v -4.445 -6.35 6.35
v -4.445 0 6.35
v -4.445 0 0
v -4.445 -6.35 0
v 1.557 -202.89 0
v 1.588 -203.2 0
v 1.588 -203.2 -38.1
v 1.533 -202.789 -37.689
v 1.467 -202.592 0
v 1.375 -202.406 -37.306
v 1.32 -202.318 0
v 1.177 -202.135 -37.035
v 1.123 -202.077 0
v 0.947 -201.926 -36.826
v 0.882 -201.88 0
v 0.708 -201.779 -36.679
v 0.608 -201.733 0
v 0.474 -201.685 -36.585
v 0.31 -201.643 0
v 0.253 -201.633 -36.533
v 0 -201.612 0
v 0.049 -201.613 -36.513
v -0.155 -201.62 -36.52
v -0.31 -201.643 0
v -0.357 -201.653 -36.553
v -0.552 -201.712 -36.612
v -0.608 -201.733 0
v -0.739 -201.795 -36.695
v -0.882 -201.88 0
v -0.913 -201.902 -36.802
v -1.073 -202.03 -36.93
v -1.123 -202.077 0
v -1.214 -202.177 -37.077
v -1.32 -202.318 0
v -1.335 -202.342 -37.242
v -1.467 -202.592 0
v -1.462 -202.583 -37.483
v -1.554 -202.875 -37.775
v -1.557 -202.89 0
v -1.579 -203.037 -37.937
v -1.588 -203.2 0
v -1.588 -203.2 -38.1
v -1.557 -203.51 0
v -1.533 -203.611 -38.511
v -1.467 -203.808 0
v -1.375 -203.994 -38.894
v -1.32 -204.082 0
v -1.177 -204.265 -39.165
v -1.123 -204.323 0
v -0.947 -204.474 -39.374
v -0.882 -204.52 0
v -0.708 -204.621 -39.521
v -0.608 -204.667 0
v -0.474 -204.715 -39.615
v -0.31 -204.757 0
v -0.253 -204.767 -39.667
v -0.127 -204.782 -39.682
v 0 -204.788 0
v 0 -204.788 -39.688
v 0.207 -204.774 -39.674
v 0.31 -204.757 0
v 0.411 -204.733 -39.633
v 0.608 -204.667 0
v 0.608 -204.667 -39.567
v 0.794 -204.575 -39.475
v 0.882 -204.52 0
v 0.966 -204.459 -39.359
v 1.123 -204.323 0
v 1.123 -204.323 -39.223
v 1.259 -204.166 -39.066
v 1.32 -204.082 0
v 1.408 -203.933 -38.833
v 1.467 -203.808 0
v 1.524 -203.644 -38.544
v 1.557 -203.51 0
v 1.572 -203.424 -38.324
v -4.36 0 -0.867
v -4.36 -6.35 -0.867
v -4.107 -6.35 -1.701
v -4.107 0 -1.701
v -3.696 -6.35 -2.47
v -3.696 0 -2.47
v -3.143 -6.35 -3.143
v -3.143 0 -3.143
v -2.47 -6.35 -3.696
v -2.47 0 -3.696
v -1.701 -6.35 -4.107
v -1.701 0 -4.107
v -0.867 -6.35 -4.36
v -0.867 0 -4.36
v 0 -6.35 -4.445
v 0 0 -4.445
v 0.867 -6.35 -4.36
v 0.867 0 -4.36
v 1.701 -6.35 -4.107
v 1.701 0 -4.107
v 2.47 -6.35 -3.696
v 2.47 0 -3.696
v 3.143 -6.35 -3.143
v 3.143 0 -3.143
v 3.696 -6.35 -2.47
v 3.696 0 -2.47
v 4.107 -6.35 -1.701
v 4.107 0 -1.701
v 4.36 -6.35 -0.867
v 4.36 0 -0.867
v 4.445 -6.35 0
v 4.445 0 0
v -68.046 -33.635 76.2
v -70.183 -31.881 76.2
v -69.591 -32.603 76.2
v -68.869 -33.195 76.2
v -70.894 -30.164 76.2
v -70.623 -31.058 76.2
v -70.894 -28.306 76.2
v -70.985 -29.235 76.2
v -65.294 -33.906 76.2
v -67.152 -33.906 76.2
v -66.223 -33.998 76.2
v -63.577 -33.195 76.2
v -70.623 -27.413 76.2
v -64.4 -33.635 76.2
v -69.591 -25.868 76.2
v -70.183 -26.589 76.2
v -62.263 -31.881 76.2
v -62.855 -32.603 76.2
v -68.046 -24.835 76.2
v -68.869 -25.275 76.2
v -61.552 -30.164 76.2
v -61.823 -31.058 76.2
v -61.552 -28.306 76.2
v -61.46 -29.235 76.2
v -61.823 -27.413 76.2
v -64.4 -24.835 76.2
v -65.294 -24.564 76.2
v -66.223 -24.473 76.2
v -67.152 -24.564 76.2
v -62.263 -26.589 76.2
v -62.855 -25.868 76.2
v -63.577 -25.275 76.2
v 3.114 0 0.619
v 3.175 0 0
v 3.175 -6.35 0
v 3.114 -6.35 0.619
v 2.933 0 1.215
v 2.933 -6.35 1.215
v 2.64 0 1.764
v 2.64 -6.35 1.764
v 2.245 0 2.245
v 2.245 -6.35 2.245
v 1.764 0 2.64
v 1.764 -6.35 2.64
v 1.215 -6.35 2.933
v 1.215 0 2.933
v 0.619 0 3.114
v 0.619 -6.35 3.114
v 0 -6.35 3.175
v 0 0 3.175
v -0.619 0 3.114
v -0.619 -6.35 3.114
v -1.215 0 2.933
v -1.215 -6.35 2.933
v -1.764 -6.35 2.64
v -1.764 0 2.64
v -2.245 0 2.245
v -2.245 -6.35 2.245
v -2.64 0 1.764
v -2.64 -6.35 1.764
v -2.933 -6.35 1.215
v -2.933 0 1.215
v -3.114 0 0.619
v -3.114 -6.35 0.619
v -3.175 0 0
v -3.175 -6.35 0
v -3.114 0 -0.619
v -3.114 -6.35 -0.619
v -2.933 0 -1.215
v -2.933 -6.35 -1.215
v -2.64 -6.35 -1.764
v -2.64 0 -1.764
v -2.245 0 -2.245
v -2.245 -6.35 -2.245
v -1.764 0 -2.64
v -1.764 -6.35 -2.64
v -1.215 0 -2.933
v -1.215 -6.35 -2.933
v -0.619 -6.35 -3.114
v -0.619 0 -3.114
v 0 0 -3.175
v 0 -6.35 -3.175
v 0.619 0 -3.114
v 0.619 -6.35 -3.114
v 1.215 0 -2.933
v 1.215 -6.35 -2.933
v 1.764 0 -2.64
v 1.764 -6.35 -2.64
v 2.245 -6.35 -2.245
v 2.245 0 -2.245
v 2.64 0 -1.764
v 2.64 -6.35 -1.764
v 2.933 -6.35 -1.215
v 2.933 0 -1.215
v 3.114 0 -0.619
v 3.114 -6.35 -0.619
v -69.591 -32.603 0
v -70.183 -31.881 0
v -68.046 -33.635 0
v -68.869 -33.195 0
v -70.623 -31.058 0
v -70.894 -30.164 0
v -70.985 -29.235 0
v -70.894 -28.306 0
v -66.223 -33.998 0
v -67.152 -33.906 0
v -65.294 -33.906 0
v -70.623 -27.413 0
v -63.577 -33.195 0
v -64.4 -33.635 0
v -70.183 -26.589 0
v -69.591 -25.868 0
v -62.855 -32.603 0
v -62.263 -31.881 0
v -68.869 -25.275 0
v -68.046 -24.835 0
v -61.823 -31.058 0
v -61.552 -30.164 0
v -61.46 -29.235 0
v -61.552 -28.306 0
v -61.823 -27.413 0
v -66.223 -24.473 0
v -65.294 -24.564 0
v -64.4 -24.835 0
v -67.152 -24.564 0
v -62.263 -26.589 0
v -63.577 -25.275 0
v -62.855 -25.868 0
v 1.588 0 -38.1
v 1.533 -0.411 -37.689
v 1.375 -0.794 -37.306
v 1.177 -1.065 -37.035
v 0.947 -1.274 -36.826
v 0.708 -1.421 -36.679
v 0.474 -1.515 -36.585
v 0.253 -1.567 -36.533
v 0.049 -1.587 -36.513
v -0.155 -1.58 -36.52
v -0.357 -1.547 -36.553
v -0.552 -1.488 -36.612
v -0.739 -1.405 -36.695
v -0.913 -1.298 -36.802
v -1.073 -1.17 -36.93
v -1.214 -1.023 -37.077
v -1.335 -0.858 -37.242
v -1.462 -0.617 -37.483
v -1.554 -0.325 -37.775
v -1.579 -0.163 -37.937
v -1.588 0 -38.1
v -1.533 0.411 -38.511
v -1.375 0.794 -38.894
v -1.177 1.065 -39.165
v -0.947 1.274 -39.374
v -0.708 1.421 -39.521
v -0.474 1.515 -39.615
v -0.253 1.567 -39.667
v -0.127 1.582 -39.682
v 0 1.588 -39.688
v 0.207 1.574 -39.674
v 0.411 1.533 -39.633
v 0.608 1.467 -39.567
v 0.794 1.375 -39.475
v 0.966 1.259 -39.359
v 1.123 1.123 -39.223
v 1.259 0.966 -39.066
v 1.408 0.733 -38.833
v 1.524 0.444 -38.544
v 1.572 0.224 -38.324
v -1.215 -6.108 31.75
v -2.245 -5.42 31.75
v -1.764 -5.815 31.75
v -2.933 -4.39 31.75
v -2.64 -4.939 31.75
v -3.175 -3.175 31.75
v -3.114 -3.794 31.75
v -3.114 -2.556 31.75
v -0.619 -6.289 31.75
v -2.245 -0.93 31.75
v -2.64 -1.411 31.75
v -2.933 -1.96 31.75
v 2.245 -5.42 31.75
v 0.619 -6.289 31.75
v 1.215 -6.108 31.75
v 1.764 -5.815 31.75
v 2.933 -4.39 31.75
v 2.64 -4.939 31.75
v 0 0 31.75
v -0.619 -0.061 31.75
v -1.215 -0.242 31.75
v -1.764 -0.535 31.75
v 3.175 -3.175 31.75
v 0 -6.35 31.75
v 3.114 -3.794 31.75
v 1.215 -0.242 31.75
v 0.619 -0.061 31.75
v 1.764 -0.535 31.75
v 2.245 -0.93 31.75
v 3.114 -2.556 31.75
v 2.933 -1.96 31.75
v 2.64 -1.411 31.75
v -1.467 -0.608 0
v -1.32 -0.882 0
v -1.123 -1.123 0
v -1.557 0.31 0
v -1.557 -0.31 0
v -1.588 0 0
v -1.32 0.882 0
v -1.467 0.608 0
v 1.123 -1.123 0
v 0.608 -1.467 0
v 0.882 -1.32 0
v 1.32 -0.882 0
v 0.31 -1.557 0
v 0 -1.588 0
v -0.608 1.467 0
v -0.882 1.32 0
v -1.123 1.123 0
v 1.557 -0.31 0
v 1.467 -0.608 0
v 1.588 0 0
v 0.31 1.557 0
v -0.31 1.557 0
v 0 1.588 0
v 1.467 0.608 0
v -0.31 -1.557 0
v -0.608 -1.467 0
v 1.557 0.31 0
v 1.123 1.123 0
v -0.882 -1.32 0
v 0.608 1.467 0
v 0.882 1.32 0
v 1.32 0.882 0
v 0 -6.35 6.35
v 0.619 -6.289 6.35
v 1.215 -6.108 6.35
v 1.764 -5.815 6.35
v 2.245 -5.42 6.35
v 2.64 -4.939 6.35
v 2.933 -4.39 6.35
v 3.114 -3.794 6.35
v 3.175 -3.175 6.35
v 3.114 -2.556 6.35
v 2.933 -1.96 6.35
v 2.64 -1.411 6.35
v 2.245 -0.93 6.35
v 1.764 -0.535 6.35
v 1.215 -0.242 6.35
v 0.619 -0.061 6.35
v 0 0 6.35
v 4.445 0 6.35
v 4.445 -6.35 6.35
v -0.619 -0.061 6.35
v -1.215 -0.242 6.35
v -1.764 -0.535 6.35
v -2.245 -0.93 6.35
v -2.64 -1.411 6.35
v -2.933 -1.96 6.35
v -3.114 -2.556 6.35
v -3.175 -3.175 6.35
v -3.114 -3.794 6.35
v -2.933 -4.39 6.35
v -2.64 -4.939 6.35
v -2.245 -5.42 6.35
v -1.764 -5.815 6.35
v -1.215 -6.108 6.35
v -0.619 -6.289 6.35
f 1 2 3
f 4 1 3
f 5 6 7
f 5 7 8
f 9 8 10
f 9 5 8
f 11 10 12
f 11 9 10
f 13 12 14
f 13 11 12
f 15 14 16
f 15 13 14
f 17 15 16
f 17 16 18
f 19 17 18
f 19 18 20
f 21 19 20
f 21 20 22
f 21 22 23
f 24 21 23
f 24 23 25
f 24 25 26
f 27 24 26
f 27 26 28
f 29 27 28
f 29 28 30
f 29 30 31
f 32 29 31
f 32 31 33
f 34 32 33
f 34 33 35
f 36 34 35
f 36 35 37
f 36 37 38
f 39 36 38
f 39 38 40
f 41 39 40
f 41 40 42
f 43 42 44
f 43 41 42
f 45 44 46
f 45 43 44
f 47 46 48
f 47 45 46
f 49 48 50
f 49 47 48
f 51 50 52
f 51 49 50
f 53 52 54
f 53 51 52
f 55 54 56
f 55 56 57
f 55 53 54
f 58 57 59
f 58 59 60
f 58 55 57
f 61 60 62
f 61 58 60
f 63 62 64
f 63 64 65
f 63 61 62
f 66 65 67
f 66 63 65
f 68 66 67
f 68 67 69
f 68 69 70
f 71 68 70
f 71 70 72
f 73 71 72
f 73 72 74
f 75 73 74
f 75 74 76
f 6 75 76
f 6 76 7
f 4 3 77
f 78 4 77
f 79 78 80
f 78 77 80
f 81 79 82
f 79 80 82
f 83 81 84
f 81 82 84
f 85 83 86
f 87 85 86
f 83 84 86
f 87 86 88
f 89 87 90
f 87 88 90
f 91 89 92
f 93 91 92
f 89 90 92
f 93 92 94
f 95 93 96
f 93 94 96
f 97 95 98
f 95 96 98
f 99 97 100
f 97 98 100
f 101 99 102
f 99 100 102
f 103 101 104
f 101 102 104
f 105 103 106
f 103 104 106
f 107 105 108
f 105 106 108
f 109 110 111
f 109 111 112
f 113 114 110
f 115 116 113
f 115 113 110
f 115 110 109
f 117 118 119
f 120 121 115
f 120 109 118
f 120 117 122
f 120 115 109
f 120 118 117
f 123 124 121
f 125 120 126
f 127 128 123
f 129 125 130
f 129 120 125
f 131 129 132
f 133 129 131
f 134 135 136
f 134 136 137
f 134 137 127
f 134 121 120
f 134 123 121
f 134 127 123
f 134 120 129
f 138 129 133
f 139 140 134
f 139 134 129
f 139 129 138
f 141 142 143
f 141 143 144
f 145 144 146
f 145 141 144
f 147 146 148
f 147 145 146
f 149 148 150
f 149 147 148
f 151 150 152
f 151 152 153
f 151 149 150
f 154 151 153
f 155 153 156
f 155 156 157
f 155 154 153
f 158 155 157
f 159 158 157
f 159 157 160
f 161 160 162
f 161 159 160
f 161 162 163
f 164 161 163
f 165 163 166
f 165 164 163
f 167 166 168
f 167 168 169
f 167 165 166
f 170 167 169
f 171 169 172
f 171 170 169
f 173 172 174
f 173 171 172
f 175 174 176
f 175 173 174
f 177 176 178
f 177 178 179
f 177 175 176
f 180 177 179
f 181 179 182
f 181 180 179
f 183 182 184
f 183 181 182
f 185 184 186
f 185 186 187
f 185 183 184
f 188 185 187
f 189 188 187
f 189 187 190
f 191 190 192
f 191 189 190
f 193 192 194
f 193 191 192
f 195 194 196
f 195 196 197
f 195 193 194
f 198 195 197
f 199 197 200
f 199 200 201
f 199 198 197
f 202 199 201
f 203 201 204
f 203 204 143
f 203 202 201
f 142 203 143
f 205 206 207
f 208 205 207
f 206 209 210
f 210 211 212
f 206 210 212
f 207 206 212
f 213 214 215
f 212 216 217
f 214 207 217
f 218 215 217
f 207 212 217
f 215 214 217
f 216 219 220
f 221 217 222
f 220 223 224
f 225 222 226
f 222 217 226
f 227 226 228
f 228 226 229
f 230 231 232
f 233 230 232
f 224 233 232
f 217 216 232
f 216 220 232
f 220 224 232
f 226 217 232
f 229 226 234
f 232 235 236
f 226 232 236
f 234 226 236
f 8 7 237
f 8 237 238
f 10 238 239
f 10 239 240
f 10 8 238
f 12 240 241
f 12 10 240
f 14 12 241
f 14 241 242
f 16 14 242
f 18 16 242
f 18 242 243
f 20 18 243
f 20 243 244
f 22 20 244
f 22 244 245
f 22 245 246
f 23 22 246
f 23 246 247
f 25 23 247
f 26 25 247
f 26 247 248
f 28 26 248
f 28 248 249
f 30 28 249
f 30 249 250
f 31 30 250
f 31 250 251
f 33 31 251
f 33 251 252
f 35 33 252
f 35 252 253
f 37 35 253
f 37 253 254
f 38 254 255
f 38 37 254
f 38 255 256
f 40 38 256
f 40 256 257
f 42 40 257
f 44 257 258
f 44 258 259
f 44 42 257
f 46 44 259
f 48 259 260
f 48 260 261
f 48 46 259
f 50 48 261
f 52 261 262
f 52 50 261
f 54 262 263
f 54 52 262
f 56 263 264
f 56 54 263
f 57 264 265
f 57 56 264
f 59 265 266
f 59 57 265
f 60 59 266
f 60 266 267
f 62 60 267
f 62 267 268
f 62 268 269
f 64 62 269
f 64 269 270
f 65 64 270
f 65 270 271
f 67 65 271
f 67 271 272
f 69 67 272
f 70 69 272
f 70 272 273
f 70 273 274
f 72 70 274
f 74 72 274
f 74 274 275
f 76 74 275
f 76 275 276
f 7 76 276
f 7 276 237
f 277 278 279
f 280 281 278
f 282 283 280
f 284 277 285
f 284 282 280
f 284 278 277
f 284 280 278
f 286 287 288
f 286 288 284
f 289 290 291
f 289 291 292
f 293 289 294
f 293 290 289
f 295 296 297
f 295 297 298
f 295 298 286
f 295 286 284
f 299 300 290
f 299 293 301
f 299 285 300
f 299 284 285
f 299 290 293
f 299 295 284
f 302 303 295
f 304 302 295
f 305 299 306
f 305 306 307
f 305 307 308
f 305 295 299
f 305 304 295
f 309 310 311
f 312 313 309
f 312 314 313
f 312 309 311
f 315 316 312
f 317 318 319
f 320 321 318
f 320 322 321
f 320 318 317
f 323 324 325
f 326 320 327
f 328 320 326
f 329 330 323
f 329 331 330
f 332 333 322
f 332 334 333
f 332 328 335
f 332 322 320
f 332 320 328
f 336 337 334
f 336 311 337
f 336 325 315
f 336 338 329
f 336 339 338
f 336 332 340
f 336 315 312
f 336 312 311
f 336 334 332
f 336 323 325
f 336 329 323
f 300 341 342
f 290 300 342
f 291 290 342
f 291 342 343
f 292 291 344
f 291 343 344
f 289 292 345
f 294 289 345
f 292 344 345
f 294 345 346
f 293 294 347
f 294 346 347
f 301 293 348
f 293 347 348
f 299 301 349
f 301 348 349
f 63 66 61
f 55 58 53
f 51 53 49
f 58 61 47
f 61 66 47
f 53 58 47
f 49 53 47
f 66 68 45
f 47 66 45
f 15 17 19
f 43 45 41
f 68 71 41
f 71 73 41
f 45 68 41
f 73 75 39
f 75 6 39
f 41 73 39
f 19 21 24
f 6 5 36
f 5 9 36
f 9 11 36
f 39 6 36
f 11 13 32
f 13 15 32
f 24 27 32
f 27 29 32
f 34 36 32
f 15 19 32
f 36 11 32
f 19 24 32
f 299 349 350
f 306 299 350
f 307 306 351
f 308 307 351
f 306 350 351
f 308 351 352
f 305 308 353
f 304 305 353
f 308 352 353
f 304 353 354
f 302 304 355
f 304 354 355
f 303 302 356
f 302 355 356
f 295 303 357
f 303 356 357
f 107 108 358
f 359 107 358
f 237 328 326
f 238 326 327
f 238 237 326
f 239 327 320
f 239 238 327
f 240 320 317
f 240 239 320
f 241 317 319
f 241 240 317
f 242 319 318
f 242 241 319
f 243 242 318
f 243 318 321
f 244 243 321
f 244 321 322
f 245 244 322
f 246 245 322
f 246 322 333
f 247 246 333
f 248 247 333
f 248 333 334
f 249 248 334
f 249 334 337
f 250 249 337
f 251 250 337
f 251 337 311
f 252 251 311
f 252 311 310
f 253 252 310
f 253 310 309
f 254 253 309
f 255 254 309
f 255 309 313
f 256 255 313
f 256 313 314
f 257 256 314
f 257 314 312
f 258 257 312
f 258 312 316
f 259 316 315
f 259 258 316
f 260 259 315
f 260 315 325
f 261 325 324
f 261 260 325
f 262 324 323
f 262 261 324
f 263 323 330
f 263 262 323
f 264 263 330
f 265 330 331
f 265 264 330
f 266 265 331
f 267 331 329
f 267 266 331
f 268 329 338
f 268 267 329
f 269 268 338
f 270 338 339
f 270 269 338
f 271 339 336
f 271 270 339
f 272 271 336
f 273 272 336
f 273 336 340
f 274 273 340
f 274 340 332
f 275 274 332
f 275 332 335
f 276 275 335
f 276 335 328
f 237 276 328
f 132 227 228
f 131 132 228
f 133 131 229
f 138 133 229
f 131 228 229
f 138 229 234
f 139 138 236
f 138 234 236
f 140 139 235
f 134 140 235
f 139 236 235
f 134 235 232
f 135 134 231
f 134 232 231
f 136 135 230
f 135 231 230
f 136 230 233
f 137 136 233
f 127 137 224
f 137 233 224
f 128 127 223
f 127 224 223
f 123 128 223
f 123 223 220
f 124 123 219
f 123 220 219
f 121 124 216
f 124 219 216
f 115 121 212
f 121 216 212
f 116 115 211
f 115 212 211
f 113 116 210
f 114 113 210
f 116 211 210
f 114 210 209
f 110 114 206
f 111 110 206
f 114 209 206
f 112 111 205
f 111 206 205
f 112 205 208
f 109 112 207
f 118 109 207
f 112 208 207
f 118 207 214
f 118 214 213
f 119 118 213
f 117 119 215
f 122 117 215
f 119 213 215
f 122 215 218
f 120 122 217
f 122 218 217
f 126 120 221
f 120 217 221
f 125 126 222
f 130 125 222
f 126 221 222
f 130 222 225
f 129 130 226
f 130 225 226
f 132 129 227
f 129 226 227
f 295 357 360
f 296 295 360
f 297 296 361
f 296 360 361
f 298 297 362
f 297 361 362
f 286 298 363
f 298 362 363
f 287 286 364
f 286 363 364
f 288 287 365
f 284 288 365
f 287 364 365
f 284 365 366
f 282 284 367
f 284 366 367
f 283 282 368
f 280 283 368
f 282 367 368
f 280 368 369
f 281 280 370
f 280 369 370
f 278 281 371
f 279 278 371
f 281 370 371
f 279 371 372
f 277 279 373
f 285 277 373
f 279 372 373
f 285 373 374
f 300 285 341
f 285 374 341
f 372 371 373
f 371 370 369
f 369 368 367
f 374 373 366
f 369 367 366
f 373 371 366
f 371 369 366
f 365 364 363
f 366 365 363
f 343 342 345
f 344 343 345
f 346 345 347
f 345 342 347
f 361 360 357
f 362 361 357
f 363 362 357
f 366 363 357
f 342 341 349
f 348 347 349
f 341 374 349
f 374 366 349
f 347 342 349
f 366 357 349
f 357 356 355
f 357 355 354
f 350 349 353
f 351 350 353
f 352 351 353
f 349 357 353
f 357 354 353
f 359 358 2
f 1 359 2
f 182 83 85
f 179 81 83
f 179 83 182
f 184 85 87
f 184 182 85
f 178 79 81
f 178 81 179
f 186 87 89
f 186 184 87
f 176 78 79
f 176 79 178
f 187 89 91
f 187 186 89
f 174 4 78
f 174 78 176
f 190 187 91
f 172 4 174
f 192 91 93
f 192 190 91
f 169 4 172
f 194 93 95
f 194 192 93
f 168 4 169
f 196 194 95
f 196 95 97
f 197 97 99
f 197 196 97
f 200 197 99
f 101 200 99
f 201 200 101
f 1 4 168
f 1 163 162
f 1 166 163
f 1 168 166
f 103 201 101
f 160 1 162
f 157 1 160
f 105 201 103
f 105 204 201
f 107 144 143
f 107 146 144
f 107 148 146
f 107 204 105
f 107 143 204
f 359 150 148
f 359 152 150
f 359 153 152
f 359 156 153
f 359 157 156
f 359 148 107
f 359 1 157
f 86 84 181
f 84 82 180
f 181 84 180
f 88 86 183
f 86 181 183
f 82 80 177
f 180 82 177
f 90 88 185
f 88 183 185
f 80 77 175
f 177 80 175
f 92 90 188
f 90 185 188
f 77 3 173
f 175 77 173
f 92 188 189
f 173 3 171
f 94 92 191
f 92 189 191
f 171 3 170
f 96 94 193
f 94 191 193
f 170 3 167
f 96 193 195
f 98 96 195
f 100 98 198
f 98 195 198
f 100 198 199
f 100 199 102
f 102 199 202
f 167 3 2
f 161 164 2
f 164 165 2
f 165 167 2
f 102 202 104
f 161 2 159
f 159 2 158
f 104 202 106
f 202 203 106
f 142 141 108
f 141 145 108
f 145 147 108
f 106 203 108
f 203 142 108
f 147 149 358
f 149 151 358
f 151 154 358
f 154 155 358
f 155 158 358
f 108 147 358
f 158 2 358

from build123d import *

# Parameters (mm, degrees)
F0_R     = 3.175
F1_DEPTH = 6.35
F3_DEPTH = 25.4
F5_R     = 1.5875
F7_R     = 4.7625
F8_DEPTH = 76.2


with BuildPart() as f1:
    # F0 (on Front) → F1 (new body)
    with BuildSketch(Plane.XZ):
        with BuildLine():
            ThreePointArc((-4.445, 0), (0, 4.445), (4.445, 0))
            Line((4.445, 0), (4.445, 6.35))
            Line((4.445, 6.35), (-4.445, 6.35))
            Line((-4.445, 6.35), (-4.445, 0))
        make_face()
        with BuildLine():
            ThreePointArc((-4.445, 0), (0, -4.445), (4.445, 0))
            ThreePointArc((4.445, 0), (0, 4.445), (-4.445, 0))
        make_face()
        Circle(F0_R, mode=Mode.SUBTRACT)
    extrude(amount=F1_DEPTH)


with BuildPart() as f3:
    # F2 (on face) → F3 (new body)
    with BuildSketch(Plane.XY.offset(6.35)):
        with BuildLine():
            ThreePointArc((0, -6.35), (2.2450640303, -5.4200640303), (3.175, -3.175))
            ThreePointArc((3.175, -3.175), (2.2450640303, -0.9299359697), (0, 0))
            ThreePointArc((0, 0), (-3.175, -3.175), (0, -6.35))
        make_face()
    extrude(amount=F3_DEPTH)


with BuildPart() as f6:
    # F6: sweep along a path in F4
    with BuildLine(Plane.YZ) as f6_path:
        Line((0, 0), (0, -38.1))
        Line((0, -38.1), (-203.2, -38.1))
        Line((-203.2, -38.1), (-203.2, 0))
    # F5 (on Top) → F6 (sweep)
    with BuildSketch(Plane.XY):
        Circle(F5_R)
    sweep(path=f6_path.line, transition=Transition.RIGHT)


with BuildPart() as f8:
    # F7 (on Top) → F8 (new body)
    with BuildSketch(Plane.XY):
        with Locations((-66.2229880691, -29.2353220284)):
            Circle(F7_R)
    extrude(amount=F8_DEPTH)


solid = Compound([f1.part, f3.part, f6.part, f8.part])
